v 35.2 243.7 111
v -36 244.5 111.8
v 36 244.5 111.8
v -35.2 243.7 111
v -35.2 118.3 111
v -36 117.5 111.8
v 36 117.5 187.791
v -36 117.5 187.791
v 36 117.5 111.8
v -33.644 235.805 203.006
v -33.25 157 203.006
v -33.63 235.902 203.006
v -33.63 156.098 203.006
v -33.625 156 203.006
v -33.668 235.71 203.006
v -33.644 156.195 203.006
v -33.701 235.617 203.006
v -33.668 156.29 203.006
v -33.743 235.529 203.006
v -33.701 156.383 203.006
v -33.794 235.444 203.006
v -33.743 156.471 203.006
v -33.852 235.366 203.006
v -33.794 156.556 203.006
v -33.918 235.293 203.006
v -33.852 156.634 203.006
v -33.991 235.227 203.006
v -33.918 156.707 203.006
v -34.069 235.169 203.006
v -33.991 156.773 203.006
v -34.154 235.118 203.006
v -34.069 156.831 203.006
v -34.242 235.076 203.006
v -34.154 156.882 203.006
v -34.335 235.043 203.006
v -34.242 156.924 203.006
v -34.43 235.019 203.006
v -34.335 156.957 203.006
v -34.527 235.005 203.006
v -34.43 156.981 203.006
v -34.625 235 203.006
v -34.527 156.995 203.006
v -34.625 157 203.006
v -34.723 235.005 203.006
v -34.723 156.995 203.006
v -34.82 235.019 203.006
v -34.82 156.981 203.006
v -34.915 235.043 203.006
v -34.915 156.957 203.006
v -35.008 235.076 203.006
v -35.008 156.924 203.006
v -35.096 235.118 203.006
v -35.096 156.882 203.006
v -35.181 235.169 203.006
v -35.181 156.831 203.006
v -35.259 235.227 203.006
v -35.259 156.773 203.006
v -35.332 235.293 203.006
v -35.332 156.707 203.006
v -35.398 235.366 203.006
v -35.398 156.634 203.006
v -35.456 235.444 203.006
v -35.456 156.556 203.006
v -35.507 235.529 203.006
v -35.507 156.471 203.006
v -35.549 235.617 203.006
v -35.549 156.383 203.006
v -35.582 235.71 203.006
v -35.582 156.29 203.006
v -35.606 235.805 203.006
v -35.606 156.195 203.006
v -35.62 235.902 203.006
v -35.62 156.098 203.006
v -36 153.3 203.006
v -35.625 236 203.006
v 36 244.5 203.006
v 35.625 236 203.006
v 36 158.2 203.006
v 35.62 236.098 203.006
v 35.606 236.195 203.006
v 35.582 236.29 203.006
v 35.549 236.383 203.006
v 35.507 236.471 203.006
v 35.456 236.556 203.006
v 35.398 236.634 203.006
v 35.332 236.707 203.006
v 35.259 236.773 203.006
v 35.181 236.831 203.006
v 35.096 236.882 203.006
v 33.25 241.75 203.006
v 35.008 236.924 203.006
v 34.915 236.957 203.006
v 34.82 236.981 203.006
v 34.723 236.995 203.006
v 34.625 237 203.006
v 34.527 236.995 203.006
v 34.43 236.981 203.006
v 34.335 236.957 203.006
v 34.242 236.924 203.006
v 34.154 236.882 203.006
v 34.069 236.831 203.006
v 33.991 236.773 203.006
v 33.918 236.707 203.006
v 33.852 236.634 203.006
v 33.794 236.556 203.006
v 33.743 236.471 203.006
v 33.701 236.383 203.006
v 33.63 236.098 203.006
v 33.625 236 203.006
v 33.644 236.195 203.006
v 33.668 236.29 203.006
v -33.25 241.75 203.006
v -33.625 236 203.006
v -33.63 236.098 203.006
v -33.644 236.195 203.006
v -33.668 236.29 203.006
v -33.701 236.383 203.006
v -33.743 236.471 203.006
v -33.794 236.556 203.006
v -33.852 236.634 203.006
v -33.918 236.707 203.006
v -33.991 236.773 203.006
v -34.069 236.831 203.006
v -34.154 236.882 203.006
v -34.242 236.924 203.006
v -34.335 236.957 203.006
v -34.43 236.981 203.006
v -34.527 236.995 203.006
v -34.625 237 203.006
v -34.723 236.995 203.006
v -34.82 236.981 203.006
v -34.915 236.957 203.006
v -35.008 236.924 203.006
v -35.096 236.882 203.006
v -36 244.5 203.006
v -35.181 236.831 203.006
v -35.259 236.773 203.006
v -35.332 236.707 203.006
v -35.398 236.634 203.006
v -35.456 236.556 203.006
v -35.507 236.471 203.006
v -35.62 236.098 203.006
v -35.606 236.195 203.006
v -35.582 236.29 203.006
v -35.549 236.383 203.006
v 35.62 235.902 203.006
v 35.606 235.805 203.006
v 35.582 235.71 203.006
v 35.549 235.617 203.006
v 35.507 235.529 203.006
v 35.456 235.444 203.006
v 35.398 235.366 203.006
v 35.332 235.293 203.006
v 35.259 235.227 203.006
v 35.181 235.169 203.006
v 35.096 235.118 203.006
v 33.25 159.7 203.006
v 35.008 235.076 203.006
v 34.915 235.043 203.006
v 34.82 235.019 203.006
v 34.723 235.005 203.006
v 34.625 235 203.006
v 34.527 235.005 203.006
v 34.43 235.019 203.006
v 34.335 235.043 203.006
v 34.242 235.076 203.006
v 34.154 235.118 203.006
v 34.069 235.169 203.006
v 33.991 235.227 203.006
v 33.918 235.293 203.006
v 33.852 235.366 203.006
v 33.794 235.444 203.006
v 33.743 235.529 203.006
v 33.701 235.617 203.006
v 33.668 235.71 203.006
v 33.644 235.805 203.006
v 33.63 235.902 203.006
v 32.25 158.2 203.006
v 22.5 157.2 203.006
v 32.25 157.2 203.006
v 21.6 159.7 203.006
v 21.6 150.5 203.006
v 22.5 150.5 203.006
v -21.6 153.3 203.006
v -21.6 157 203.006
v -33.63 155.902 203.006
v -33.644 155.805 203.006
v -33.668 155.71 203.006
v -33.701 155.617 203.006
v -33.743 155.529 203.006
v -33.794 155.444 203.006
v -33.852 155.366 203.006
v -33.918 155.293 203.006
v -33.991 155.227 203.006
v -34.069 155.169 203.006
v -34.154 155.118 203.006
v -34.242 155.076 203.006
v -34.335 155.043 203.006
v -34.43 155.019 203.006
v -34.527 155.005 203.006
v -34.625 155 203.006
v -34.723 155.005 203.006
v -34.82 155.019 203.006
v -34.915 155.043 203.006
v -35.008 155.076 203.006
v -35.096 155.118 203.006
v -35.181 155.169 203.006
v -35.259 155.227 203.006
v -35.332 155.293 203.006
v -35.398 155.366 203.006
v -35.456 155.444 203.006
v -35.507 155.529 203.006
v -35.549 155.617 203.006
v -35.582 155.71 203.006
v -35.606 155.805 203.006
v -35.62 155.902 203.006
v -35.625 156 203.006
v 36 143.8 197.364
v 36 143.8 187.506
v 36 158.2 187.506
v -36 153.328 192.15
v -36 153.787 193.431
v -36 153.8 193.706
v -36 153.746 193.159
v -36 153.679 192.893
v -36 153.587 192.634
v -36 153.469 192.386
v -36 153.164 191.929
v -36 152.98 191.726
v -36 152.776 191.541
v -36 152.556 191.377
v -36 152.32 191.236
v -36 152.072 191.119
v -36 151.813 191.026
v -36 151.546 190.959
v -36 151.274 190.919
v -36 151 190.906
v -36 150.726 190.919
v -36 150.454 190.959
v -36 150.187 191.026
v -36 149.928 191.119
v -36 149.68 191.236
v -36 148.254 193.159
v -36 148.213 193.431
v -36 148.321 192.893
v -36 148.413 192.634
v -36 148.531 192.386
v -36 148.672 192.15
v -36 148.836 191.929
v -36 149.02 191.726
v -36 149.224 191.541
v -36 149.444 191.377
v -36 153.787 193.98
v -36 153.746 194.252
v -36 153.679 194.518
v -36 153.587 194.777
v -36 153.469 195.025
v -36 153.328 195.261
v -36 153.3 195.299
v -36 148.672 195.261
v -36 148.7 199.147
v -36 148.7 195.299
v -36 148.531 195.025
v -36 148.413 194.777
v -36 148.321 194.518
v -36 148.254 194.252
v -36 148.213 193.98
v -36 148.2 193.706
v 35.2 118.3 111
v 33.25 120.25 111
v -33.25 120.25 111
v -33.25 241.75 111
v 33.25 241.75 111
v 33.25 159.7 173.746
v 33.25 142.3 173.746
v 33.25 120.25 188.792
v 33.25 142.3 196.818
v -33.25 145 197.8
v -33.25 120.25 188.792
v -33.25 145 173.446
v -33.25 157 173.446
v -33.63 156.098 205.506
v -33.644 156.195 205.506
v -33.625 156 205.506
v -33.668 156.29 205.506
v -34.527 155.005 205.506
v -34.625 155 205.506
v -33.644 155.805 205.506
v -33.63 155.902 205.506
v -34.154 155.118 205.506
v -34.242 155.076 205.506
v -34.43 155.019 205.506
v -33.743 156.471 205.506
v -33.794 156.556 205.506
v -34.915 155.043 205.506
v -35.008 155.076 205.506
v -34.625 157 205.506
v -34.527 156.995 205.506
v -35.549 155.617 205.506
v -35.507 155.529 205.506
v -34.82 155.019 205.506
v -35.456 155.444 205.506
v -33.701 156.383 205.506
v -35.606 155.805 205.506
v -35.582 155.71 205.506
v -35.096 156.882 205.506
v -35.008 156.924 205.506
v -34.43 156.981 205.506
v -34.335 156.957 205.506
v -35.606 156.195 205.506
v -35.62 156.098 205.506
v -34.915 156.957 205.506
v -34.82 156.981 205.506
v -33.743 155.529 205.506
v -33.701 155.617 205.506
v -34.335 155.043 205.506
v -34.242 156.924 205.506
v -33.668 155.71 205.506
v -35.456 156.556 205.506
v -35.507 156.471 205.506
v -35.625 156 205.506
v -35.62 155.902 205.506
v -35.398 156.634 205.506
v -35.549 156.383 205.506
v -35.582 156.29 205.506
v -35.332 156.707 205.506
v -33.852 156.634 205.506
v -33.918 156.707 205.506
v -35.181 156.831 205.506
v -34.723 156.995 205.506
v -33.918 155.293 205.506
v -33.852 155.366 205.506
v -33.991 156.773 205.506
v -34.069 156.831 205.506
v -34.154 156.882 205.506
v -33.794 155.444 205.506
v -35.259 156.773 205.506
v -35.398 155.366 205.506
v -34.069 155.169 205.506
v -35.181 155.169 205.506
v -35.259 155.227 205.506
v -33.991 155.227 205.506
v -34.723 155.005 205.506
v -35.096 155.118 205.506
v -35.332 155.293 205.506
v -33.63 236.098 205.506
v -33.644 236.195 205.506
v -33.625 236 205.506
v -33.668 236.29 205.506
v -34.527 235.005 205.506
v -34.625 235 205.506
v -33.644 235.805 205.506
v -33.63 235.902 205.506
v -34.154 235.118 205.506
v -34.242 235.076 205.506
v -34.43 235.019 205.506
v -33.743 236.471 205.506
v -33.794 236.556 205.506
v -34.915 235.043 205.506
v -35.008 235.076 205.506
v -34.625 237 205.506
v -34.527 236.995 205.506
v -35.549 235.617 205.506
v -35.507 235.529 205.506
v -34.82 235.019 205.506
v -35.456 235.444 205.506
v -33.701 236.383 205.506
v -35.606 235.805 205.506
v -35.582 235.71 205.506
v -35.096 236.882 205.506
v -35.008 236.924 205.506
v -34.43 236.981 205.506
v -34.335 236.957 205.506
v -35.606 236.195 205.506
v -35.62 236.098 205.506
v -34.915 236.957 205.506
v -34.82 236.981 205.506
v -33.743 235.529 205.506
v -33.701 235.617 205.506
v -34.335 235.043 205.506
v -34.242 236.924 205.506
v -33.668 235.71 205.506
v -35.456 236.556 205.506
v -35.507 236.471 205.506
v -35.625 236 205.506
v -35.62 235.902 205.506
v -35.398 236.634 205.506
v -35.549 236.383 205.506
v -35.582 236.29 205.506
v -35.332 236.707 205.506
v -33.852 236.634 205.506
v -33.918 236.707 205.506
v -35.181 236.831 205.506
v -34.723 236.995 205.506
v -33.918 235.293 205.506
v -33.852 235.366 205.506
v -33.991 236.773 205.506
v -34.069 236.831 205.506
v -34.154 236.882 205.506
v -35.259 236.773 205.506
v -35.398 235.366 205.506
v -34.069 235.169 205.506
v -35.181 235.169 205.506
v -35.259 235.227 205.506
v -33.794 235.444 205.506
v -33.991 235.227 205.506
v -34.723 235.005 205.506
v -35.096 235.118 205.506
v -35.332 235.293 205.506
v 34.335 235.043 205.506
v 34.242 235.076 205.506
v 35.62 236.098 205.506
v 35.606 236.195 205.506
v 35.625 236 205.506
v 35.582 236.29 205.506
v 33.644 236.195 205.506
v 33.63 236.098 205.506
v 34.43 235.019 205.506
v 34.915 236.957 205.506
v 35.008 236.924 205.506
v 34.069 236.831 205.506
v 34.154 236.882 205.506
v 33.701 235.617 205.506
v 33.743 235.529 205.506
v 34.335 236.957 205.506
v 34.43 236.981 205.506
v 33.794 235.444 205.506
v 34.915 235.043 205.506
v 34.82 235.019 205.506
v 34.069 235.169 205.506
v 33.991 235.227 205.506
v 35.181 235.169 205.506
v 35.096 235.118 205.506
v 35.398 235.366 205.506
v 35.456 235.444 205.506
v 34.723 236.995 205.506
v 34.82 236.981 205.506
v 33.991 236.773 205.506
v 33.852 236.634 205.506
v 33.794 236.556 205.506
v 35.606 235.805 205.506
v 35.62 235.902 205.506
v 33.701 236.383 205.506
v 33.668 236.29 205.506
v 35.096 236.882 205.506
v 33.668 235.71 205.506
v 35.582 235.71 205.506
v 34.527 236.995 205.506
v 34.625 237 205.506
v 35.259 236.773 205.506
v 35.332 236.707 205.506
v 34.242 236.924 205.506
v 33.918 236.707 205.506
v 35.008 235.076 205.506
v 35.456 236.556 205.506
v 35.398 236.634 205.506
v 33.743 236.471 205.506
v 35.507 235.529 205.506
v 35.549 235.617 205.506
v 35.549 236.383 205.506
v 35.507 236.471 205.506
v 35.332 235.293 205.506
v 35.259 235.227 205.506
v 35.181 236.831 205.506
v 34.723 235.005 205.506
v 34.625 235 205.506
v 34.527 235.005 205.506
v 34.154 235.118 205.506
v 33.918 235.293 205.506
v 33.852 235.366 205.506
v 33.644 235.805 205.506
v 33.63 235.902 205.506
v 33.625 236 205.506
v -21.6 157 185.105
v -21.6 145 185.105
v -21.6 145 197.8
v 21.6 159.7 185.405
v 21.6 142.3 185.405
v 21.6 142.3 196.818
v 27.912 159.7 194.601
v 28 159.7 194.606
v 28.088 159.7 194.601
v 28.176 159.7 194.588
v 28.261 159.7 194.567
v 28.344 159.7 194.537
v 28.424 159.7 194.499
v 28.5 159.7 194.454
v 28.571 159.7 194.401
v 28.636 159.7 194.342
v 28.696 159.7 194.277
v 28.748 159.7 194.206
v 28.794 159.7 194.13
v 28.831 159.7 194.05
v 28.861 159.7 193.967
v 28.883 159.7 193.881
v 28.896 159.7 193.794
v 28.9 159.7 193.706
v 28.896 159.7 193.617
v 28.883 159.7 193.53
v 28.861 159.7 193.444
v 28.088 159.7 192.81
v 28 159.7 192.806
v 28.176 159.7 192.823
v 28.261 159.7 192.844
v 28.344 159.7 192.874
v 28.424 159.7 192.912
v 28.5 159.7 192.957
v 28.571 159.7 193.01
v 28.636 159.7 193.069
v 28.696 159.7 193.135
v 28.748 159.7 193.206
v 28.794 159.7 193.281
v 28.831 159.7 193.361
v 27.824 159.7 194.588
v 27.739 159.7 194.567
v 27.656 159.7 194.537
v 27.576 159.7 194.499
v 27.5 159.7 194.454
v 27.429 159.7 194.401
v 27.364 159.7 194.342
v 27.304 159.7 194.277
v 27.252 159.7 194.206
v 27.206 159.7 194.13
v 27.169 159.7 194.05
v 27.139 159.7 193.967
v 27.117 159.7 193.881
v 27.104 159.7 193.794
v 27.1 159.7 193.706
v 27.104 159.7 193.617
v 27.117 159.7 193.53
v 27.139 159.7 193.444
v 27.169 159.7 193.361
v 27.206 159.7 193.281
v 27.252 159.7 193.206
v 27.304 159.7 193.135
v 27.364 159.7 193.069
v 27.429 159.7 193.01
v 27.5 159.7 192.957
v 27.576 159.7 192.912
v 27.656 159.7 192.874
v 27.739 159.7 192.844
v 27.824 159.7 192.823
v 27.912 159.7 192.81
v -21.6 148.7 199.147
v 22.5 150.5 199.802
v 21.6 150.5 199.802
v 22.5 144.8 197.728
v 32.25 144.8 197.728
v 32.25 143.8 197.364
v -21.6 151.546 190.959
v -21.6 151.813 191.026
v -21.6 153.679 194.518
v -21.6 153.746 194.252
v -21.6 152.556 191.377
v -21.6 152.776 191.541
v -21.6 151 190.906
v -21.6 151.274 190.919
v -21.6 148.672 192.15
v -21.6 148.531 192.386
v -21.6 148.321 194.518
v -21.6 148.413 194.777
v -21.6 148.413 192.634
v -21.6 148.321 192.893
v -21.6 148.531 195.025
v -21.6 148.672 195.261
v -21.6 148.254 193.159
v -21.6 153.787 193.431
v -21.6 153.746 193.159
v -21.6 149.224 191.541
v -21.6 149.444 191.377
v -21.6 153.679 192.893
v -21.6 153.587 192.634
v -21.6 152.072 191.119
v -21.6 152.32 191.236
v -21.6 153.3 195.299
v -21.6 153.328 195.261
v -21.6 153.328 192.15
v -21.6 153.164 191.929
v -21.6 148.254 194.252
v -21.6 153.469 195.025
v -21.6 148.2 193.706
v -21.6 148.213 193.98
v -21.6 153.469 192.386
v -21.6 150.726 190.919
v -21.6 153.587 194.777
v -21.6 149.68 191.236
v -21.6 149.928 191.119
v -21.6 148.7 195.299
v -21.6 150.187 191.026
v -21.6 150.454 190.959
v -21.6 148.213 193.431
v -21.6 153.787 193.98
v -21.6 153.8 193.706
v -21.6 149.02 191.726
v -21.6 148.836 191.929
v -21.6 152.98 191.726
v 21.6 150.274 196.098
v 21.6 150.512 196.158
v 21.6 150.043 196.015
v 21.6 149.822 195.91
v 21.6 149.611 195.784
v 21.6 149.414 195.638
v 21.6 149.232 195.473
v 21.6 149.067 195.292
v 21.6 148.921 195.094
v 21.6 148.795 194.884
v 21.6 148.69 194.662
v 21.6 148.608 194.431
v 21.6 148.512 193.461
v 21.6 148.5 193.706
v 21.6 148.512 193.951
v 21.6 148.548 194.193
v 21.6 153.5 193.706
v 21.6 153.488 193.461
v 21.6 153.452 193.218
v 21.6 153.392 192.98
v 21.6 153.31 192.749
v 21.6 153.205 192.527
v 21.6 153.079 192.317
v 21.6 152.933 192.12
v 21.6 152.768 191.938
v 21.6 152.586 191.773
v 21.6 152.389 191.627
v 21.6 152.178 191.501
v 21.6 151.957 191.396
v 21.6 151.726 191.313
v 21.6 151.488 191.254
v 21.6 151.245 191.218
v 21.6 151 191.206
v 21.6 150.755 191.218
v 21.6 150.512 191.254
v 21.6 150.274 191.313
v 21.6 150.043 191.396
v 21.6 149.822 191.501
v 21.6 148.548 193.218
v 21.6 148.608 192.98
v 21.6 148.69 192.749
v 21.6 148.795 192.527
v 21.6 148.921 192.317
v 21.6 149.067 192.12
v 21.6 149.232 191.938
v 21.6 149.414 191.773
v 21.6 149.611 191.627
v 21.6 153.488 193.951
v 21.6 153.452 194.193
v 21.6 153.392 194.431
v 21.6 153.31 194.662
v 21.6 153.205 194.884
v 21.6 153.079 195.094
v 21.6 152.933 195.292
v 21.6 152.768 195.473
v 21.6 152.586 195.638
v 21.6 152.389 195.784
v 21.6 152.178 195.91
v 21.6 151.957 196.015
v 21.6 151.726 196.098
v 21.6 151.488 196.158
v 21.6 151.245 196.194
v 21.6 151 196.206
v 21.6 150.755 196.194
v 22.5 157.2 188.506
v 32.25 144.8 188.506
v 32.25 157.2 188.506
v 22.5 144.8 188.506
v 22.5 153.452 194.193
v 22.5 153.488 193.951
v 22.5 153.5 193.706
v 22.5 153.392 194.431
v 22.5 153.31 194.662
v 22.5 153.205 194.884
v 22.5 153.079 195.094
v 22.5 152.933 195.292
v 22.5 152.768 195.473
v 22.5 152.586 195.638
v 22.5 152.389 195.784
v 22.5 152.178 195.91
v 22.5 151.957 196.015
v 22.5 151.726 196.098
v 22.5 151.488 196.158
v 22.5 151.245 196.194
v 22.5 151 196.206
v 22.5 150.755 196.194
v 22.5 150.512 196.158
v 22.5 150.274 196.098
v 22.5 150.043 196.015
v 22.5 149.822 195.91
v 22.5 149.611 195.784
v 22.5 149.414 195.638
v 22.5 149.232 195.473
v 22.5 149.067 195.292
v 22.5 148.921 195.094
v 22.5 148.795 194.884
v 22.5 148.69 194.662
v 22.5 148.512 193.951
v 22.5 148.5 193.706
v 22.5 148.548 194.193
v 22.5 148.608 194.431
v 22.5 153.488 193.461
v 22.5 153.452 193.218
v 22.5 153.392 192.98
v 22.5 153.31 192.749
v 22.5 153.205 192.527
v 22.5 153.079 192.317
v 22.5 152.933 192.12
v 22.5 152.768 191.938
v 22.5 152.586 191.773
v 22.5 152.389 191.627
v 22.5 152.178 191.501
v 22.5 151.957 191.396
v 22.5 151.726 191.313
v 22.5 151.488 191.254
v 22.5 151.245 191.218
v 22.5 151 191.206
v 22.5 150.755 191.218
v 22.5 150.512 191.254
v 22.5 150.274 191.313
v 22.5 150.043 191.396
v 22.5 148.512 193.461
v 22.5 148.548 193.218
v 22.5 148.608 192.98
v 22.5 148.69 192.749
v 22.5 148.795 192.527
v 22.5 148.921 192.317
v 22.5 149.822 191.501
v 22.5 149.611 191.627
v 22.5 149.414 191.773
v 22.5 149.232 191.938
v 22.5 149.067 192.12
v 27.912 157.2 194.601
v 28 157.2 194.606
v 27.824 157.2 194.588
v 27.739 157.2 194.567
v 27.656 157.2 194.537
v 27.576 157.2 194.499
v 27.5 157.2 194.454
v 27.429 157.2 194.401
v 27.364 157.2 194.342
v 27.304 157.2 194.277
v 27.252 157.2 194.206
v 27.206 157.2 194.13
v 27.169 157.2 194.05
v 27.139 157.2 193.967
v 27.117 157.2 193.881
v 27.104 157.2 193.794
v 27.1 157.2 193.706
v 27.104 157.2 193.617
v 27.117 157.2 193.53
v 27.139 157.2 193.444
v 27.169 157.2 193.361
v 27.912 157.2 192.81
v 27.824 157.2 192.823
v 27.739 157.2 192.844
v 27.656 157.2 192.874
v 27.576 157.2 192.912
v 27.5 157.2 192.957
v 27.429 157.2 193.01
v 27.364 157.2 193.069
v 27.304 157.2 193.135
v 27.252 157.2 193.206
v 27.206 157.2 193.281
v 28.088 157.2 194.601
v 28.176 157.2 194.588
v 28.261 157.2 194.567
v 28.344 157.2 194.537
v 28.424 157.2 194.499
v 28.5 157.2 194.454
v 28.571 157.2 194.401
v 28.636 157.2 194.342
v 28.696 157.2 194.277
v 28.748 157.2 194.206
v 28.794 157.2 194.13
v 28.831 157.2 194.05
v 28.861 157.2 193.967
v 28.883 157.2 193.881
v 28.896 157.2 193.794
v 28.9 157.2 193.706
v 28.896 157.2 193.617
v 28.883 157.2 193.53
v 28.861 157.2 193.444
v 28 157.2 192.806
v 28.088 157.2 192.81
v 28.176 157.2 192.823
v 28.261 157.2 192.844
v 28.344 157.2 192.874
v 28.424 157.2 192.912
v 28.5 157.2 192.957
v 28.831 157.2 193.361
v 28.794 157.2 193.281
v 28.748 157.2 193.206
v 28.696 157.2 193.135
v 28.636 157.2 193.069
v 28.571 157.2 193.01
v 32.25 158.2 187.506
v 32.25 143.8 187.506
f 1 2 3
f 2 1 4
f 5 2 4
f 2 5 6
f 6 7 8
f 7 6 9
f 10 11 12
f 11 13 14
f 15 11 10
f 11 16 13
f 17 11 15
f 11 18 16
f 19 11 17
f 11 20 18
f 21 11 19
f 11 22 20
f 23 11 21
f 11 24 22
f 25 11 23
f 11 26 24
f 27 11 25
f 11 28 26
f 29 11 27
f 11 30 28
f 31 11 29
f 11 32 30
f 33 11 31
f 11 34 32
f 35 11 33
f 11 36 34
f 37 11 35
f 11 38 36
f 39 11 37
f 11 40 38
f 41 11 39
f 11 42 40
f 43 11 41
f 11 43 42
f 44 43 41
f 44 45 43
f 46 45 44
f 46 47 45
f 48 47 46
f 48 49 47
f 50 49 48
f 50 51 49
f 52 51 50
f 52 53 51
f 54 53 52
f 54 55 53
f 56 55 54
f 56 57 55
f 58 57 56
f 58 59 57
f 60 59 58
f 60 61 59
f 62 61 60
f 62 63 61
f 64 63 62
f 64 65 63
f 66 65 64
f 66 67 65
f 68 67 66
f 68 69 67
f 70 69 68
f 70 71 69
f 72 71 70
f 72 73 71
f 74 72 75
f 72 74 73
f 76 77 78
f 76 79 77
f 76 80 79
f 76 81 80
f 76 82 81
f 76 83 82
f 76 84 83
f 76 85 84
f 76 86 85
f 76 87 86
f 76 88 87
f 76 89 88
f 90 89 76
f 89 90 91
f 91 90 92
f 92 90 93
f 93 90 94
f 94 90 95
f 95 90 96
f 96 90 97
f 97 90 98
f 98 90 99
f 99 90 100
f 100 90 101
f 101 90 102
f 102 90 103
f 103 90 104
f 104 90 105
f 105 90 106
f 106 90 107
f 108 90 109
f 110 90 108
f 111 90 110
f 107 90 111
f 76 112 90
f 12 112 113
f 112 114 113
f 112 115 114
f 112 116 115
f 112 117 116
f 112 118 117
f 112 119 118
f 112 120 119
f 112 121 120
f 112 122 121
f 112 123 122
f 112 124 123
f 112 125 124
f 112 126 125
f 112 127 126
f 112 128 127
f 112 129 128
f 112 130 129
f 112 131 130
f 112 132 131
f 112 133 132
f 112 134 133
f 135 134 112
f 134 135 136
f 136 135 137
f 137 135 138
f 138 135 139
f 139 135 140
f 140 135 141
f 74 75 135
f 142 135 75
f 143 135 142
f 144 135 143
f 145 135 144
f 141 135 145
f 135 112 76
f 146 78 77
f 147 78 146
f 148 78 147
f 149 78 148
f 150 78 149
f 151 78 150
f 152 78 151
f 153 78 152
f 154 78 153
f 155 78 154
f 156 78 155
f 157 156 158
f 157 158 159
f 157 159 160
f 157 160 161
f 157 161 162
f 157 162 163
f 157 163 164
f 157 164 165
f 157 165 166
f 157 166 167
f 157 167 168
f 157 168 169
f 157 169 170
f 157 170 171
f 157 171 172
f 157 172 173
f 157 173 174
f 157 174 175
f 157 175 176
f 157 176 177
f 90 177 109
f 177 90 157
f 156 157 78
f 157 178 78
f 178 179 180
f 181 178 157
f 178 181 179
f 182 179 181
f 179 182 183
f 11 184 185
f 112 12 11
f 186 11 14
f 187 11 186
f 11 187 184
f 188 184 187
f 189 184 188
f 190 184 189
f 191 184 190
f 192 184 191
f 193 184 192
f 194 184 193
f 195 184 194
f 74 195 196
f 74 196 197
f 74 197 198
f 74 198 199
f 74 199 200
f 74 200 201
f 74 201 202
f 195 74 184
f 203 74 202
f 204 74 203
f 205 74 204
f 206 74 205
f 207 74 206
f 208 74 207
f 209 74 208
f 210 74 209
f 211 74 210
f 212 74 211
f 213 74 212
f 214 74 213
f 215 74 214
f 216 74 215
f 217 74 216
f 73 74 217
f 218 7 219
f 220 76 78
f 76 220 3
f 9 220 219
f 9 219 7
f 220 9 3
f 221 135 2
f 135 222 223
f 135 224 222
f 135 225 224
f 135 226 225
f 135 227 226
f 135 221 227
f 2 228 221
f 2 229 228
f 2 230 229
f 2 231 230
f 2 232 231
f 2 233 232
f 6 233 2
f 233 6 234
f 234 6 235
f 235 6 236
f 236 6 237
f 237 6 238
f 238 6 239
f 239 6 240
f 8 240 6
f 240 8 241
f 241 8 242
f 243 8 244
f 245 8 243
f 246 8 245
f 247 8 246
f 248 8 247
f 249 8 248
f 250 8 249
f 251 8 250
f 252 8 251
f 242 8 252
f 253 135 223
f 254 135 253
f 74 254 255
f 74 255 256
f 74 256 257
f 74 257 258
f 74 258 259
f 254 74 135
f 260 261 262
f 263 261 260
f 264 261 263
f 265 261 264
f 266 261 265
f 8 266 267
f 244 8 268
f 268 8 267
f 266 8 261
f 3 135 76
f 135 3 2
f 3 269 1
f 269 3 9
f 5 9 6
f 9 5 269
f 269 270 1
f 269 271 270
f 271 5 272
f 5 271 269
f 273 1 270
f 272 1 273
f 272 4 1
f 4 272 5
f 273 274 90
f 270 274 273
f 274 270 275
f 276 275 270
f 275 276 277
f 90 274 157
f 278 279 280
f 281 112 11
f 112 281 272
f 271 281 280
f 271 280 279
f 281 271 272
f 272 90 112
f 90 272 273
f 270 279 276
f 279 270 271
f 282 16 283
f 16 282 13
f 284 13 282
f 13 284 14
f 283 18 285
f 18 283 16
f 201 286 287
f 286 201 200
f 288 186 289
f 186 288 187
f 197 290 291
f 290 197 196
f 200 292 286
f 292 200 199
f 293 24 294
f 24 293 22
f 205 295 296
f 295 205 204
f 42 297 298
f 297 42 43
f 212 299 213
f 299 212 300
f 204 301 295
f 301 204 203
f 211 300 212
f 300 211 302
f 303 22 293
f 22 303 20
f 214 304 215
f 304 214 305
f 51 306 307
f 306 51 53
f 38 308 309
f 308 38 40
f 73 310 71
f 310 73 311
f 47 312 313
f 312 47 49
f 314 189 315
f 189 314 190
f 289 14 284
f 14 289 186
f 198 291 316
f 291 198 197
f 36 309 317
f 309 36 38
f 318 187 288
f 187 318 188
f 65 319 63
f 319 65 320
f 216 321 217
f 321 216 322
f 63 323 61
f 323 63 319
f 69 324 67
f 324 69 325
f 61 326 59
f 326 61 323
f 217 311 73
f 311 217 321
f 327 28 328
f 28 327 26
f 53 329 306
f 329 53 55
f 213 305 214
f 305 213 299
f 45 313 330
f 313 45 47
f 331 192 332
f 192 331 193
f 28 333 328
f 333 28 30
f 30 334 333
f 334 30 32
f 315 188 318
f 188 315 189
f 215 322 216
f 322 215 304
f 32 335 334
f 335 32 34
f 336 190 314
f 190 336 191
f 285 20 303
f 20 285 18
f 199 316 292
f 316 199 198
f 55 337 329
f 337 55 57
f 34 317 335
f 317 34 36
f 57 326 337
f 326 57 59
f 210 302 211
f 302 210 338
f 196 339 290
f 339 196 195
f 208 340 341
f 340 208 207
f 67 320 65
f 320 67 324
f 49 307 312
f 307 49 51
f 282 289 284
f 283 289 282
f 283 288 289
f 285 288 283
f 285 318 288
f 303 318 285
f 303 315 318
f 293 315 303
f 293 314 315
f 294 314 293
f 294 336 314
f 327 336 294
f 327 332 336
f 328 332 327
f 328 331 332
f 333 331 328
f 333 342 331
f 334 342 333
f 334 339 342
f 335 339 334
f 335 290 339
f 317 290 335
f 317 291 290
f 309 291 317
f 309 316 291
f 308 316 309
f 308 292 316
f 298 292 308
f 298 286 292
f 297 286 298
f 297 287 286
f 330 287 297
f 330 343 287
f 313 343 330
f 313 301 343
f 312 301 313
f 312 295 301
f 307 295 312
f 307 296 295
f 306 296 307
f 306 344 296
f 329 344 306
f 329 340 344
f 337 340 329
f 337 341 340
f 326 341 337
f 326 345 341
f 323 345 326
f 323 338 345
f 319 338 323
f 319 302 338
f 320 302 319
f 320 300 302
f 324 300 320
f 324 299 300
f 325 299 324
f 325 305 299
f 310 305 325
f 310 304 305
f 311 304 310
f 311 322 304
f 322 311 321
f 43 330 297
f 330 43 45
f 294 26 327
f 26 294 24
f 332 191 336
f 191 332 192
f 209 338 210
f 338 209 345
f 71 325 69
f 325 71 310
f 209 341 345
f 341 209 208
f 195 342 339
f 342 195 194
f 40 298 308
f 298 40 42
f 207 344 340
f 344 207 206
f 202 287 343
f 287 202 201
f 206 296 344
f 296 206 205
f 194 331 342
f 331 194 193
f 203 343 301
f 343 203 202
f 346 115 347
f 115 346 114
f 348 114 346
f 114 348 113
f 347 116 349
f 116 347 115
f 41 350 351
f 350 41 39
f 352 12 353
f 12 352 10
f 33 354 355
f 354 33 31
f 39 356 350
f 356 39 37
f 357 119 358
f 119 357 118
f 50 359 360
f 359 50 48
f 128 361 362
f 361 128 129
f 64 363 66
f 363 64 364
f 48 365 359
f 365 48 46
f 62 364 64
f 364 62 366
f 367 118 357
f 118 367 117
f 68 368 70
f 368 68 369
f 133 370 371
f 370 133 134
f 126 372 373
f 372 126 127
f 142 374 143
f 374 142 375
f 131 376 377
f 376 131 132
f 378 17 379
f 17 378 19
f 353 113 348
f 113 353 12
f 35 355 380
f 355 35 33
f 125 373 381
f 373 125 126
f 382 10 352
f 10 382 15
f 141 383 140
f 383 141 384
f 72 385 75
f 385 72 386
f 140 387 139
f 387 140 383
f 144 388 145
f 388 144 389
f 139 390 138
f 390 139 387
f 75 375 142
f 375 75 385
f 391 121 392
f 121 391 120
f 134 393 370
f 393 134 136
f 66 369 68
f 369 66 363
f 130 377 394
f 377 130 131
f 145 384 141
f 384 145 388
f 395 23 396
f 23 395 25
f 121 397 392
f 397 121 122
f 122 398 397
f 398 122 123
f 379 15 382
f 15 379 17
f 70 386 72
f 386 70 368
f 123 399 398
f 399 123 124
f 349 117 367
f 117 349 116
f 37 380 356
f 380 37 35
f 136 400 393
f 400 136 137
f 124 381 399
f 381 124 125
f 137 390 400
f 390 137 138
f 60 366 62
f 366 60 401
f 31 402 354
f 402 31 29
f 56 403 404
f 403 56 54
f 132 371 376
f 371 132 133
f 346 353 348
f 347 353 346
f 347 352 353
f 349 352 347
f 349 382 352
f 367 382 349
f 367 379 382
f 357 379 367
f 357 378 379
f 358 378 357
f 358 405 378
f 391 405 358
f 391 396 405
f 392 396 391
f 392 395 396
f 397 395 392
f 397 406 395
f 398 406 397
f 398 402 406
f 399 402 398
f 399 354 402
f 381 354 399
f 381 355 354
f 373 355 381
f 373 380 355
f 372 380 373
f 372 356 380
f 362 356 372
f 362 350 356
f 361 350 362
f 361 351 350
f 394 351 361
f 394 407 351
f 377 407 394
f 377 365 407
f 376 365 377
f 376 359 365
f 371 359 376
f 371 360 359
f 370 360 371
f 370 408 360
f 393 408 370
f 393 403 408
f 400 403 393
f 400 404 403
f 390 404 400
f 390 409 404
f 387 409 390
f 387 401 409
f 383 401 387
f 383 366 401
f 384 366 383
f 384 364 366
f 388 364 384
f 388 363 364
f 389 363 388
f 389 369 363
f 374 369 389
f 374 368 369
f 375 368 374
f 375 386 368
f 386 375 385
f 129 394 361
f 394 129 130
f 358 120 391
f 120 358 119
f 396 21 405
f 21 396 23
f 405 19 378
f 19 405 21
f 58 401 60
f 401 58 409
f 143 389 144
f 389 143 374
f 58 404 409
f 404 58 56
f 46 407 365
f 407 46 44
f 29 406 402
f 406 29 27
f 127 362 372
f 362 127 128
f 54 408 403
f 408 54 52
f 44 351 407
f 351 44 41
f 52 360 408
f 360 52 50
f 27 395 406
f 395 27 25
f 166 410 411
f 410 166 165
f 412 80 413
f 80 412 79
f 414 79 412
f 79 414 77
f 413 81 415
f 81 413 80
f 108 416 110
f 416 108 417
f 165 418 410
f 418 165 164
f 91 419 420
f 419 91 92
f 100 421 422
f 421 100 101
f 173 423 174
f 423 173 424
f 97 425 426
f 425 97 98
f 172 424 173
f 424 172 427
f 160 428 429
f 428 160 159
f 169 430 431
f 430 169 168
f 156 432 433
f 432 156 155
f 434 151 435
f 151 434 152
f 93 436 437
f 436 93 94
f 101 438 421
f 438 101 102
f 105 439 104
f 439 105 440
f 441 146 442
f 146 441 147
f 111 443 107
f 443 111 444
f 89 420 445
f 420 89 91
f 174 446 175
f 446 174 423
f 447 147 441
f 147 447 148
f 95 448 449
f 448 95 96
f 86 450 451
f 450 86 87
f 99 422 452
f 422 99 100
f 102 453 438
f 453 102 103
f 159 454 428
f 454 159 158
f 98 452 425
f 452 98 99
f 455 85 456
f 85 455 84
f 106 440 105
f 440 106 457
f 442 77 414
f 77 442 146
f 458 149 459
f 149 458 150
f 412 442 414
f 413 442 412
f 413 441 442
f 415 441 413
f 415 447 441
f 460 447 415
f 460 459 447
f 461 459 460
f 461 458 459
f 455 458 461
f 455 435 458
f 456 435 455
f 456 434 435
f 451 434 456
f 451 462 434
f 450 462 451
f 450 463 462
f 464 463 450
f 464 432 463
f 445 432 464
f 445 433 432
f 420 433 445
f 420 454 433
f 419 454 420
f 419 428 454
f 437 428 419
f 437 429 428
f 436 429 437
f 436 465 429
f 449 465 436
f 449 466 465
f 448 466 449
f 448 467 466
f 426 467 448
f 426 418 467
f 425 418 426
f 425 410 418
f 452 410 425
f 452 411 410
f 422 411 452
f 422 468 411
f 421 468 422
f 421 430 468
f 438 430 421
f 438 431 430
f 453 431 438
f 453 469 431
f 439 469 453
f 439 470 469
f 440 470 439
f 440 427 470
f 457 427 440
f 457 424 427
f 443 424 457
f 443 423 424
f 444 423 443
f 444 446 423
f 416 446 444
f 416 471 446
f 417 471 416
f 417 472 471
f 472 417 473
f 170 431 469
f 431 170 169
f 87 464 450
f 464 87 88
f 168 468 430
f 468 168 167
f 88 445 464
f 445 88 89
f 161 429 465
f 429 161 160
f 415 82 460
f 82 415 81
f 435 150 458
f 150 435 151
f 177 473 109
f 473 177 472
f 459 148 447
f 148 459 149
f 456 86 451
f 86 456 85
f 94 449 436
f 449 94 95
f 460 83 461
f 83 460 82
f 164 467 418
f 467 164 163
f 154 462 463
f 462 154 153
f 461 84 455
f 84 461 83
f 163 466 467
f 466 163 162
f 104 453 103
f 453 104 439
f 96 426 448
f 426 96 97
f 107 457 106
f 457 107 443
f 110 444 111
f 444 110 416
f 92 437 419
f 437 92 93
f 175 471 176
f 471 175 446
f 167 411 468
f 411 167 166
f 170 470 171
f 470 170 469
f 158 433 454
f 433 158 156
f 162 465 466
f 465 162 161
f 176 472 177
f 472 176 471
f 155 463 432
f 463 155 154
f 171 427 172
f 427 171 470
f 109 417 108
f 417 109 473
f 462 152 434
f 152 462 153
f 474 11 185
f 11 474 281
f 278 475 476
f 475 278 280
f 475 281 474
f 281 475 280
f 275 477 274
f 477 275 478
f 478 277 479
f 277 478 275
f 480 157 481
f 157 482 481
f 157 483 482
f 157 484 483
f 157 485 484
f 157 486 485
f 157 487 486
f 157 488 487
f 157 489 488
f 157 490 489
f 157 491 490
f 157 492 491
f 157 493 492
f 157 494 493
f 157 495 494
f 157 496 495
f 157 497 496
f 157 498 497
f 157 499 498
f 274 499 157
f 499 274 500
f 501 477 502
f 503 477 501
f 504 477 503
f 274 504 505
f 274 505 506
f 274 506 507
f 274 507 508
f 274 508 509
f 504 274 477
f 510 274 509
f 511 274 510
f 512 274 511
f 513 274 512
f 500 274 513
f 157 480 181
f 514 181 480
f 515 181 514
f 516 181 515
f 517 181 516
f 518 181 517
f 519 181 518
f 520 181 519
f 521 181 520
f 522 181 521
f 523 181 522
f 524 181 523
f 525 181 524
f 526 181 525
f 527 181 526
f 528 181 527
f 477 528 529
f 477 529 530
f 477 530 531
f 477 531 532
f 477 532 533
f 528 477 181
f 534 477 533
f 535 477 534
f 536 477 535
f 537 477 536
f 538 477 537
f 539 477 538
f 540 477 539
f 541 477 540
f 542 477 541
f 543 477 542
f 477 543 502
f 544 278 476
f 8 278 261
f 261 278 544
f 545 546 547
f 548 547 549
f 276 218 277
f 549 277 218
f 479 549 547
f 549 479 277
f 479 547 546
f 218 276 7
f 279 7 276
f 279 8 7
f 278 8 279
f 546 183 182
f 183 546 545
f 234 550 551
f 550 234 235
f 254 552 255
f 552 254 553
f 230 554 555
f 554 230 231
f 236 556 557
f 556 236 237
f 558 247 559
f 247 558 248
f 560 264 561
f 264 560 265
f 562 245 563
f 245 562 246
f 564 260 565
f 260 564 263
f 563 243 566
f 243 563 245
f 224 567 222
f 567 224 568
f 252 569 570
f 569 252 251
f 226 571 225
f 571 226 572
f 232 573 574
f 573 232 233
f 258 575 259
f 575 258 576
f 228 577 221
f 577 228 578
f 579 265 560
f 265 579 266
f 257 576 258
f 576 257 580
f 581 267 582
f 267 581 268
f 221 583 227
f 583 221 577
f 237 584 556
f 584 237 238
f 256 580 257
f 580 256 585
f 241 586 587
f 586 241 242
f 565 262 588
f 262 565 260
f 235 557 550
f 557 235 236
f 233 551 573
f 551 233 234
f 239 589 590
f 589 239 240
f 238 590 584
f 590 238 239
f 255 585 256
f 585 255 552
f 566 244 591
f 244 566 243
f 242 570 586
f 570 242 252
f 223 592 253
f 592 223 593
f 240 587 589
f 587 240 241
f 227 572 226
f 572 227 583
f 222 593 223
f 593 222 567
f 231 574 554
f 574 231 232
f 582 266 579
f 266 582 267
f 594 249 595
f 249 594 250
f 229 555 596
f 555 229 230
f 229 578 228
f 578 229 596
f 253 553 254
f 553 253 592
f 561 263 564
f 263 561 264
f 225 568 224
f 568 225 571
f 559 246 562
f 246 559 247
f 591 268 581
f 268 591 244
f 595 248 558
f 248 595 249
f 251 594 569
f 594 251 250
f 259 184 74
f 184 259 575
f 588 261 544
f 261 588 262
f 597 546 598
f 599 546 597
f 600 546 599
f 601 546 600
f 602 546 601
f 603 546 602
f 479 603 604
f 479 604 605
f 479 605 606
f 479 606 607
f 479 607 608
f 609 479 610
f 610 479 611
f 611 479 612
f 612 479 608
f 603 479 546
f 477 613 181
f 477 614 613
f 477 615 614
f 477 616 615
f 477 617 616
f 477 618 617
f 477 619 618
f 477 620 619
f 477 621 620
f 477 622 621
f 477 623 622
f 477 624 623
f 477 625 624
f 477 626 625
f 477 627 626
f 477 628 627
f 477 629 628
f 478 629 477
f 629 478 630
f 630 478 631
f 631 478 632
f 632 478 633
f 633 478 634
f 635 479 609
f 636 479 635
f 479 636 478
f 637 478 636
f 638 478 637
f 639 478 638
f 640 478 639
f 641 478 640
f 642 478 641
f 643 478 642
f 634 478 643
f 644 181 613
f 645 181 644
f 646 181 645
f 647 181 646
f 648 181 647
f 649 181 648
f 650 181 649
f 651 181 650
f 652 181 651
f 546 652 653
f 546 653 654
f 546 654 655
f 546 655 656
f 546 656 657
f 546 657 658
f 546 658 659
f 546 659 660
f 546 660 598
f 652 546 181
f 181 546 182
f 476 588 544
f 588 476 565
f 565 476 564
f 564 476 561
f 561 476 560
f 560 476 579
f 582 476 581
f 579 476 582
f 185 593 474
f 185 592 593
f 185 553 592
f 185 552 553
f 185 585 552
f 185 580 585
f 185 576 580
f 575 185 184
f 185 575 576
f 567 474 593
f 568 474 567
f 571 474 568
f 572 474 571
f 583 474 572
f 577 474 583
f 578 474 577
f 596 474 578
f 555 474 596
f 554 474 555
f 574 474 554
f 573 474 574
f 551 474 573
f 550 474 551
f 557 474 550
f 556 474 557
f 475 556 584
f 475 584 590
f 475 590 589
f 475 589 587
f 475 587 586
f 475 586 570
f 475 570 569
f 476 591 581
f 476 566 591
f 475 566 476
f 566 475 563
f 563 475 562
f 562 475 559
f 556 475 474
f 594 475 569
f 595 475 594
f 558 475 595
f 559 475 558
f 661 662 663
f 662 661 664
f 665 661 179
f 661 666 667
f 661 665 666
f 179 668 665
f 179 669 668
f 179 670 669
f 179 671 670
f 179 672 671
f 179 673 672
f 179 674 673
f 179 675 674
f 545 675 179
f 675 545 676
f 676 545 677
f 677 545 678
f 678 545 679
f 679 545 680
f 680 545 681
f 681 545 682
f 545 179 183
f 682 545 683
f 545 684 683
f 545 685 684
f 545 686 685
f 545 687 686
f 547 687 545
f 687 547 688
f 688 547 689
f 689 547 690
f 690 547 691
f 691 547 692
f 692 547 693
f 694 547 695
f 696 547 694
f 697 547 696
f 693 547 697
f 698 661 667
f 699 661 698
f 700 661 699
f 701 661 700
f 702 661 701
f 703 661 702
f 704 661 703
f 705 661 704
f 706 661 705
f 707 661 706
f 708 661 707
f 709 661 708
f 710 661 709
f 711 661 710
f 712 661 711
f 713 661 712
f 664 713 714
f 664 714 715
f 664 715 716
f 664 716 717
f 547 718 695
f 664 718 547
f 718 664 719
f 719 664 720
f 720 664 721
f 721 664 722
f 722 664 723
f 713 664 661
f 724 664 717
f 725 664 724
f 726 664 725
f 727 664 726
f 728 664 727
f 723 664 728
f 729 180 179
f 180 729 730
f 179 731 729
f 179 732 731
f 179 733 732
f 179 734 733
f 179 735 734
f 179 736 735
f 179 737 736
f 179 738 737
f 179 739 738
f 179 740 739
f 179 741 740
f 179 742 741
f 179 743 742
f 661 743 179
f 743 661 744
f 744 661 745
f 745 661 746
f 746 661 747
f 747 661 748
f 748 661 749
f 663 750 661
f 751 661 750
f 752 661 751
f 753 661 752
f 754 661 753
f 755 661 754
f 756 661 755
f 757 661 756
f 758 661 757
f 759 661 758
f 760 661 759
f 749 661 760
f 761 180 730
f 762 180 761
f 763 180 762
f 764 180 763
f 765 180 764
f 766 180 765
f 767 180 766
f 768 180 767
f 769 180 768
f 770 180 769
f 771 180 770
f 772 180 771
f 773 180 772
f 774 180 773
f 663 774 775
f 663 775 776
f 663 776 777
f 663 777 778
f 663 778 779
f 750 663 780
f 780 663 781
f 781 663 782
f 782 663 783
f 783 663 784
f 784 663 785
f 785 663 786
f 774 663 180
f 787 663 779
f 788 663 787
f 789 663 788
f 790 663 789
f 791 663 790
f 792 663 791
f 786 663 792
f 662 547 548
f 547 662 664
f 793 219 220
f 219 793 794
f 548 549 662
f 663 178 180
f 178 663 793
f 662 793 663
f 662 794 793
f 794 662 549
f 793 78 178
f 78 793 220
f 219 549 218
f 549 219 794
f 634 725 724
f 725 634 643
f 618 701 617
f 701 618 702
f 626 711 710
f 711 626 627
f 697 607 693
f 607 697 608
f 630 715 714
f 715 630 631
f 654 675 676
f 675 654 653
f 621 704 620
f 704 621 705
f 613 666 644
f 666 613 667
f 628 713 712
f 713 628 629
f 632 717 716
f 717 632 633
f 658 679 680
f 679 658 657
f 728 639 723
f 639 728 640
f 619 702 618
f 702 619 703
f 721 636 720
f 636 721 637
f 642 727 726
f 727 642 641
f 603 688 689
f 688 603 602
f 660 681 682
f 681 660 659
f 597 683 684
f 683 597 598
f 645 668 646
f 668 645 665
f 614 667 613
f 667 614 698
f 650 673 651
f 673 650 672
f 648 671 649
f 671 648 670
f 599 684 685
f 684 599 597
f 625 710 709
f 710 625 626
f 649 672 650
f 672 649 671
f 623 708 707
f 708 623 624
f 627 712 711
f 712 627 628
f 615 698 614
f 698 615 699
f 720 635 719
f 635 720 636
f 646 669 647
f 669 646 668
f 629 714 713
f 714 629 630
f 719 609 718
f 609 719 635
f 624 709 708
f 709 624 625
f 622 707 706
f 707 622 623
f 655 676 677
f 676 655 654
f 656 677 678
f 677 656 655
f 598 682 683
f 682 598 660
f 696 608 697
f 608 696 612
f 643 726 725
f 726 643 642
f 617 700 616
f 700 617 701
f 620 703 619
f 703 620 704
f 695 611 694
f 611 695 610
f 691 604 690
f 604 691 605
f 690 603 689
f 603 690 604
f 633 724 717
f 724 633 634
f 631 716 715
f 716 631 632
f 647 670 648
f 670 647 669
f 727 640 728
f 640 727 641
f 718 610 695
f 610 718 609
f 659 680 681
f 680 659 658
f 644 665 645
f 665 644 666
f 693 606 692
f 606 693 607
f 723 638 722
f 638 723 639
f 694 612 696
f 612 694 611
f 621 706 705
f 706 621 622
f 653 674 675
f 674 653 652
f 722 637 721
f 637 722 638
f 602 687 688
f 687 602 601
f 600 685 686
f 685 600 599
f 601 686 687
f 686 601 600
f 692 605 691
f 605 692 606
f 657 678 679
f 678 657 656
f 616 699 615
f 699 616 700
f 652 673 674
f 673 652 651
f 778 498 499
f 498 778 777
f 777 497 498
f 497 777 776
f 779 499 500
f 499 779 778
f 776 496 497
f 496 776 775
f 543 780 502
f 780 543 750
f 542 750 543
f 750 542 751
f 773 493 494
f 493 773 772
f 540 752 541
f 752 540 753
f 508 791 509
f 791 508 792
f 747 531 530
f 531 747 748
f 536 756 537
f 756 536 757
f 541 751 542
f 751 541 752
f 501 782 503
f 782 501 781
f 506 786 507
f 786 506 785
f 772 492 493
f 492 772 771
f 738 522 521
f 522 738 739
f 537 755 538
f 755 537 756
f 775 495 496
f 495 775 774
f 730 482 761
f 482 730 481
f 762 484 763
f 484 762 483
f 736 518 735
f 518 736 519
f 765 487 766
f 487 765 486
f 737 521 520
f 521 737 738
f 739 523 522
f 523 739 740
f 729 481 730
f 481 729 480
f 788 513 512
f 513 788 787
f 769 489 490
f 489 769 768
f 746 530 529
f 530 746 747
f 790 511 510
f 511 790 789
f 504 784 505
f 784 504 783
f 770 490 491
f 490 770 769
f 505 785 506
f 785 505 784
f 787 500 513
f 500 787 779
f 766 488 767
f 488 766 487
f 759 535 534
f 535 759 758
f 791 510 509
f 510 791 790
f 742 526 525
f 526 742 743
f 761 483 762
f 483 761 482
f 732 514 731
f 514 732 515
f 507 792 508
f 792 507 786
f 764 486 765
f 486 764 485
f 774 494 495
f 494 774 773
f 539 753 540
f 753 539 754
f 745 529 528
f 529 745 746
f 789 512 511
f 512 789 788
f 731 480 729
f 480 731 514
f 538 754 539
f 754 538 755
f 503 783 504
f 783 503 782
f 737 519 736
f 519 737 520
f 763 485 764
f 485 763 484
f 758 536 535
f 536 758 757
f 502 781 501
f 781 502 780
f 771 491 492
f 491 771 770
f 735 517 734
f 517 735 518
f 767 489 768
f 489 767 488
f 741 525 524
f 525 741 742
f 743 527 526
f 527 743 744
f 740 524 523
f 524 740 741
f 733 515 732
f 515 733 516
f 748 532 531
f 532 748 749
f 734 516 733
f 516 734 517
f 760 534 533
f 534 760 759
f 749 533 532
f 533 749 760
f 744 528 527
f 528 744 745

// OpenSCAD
// Pieces for the feeder box v4 pictures (render.py exports each `what` as an STL).
include <../../bed_chute.scad>
use <../../feeder4.scad>
use <../../enclosure.scad>
use <../../feeder.scad>
part = "none";
what = "stand";
slice = false;      // true: only a 4 mm slab through the right wheel (side section pictures)
module F() translate([0, 150, 111]) children();
// a card just let go: its tail at the nip, sliding along the exit line onto the lands
module card_out() on_bed() translate([-31.5, 99.3 - 88, 3.62]) cube([63, 88, 0.3]);
module piece() {
    if (what == "bed") on_bed() bed_plate3();
    if (what == "walls") { bed_side(false); mirror([1, 0, 0]) bed_side(true); }
    if (what == "gate") stop_gate(true);
    if (what == "stand") F() stand4();
    if (what == "hopper") F() hopper4();
    if (what == "shoe") F() shoe4();
    if (what == "pads") F() pads();
    if (what == "roller") F() roller4();
    if (what == "motor") F() translate([22.5, 1.0 - 6.2, 82.7 - 5.2]) cube([26, 12.4, 10.4]);
    if (what == "stack") F() for (i = [0:24]) translate([-31.5, 0.6, 97.25 + 0.32 * i]) cube([63, 88, 0.3]);
    if (what == "card") card_out();
    if (what == "weight") F() translate([0, 46, 97.25 + 0.32 * 25]) weight_solid();
    if (what == "fence") translate([0, 31 + 150, 111 - 0.01]) linear_extrude(2) difference() {
        square([73 + 4.6, 128 + 4.6], center = true); square([73.6, 128.6], center = true); }
    if (what == "bridge") translate([-52, 110, 107]) cube([104, 150, 4]);
    // the parts as printed
    if (what == "p_stand") stand4();
    if (what == "p_hopper") translate([0, 0, -92]) hopper4();
    if (what == "p_shoe") rotate([-90, 0, 0]) shoe4();
    if (what == "p_roller") translate([0, 0, 20.5]) rotate([0, 90, 0]) roller4_body();
    if (what == "flatbed") bed_plate3();
    if (what == "tower") tower();
    if (what == "deck") intersection() { union() for (xi = [0, 1], yi = [0, 1]) deck_tile(xi, yi); translate([-70, 120, 0]) cube([140, 150, 400]); }
}
yslice = false;     // true: only a 3 mm slab across the box at y 40 (the foot and ridge section)
if (slice) intersection() { piece(); translate([14.75, -200, -10]) cube([4, 600, 600]); }
else if (yslice) intersection() { piece(); translate([-100, 188.5, -10]) cube([200, 3, 600]); }
else piece();
